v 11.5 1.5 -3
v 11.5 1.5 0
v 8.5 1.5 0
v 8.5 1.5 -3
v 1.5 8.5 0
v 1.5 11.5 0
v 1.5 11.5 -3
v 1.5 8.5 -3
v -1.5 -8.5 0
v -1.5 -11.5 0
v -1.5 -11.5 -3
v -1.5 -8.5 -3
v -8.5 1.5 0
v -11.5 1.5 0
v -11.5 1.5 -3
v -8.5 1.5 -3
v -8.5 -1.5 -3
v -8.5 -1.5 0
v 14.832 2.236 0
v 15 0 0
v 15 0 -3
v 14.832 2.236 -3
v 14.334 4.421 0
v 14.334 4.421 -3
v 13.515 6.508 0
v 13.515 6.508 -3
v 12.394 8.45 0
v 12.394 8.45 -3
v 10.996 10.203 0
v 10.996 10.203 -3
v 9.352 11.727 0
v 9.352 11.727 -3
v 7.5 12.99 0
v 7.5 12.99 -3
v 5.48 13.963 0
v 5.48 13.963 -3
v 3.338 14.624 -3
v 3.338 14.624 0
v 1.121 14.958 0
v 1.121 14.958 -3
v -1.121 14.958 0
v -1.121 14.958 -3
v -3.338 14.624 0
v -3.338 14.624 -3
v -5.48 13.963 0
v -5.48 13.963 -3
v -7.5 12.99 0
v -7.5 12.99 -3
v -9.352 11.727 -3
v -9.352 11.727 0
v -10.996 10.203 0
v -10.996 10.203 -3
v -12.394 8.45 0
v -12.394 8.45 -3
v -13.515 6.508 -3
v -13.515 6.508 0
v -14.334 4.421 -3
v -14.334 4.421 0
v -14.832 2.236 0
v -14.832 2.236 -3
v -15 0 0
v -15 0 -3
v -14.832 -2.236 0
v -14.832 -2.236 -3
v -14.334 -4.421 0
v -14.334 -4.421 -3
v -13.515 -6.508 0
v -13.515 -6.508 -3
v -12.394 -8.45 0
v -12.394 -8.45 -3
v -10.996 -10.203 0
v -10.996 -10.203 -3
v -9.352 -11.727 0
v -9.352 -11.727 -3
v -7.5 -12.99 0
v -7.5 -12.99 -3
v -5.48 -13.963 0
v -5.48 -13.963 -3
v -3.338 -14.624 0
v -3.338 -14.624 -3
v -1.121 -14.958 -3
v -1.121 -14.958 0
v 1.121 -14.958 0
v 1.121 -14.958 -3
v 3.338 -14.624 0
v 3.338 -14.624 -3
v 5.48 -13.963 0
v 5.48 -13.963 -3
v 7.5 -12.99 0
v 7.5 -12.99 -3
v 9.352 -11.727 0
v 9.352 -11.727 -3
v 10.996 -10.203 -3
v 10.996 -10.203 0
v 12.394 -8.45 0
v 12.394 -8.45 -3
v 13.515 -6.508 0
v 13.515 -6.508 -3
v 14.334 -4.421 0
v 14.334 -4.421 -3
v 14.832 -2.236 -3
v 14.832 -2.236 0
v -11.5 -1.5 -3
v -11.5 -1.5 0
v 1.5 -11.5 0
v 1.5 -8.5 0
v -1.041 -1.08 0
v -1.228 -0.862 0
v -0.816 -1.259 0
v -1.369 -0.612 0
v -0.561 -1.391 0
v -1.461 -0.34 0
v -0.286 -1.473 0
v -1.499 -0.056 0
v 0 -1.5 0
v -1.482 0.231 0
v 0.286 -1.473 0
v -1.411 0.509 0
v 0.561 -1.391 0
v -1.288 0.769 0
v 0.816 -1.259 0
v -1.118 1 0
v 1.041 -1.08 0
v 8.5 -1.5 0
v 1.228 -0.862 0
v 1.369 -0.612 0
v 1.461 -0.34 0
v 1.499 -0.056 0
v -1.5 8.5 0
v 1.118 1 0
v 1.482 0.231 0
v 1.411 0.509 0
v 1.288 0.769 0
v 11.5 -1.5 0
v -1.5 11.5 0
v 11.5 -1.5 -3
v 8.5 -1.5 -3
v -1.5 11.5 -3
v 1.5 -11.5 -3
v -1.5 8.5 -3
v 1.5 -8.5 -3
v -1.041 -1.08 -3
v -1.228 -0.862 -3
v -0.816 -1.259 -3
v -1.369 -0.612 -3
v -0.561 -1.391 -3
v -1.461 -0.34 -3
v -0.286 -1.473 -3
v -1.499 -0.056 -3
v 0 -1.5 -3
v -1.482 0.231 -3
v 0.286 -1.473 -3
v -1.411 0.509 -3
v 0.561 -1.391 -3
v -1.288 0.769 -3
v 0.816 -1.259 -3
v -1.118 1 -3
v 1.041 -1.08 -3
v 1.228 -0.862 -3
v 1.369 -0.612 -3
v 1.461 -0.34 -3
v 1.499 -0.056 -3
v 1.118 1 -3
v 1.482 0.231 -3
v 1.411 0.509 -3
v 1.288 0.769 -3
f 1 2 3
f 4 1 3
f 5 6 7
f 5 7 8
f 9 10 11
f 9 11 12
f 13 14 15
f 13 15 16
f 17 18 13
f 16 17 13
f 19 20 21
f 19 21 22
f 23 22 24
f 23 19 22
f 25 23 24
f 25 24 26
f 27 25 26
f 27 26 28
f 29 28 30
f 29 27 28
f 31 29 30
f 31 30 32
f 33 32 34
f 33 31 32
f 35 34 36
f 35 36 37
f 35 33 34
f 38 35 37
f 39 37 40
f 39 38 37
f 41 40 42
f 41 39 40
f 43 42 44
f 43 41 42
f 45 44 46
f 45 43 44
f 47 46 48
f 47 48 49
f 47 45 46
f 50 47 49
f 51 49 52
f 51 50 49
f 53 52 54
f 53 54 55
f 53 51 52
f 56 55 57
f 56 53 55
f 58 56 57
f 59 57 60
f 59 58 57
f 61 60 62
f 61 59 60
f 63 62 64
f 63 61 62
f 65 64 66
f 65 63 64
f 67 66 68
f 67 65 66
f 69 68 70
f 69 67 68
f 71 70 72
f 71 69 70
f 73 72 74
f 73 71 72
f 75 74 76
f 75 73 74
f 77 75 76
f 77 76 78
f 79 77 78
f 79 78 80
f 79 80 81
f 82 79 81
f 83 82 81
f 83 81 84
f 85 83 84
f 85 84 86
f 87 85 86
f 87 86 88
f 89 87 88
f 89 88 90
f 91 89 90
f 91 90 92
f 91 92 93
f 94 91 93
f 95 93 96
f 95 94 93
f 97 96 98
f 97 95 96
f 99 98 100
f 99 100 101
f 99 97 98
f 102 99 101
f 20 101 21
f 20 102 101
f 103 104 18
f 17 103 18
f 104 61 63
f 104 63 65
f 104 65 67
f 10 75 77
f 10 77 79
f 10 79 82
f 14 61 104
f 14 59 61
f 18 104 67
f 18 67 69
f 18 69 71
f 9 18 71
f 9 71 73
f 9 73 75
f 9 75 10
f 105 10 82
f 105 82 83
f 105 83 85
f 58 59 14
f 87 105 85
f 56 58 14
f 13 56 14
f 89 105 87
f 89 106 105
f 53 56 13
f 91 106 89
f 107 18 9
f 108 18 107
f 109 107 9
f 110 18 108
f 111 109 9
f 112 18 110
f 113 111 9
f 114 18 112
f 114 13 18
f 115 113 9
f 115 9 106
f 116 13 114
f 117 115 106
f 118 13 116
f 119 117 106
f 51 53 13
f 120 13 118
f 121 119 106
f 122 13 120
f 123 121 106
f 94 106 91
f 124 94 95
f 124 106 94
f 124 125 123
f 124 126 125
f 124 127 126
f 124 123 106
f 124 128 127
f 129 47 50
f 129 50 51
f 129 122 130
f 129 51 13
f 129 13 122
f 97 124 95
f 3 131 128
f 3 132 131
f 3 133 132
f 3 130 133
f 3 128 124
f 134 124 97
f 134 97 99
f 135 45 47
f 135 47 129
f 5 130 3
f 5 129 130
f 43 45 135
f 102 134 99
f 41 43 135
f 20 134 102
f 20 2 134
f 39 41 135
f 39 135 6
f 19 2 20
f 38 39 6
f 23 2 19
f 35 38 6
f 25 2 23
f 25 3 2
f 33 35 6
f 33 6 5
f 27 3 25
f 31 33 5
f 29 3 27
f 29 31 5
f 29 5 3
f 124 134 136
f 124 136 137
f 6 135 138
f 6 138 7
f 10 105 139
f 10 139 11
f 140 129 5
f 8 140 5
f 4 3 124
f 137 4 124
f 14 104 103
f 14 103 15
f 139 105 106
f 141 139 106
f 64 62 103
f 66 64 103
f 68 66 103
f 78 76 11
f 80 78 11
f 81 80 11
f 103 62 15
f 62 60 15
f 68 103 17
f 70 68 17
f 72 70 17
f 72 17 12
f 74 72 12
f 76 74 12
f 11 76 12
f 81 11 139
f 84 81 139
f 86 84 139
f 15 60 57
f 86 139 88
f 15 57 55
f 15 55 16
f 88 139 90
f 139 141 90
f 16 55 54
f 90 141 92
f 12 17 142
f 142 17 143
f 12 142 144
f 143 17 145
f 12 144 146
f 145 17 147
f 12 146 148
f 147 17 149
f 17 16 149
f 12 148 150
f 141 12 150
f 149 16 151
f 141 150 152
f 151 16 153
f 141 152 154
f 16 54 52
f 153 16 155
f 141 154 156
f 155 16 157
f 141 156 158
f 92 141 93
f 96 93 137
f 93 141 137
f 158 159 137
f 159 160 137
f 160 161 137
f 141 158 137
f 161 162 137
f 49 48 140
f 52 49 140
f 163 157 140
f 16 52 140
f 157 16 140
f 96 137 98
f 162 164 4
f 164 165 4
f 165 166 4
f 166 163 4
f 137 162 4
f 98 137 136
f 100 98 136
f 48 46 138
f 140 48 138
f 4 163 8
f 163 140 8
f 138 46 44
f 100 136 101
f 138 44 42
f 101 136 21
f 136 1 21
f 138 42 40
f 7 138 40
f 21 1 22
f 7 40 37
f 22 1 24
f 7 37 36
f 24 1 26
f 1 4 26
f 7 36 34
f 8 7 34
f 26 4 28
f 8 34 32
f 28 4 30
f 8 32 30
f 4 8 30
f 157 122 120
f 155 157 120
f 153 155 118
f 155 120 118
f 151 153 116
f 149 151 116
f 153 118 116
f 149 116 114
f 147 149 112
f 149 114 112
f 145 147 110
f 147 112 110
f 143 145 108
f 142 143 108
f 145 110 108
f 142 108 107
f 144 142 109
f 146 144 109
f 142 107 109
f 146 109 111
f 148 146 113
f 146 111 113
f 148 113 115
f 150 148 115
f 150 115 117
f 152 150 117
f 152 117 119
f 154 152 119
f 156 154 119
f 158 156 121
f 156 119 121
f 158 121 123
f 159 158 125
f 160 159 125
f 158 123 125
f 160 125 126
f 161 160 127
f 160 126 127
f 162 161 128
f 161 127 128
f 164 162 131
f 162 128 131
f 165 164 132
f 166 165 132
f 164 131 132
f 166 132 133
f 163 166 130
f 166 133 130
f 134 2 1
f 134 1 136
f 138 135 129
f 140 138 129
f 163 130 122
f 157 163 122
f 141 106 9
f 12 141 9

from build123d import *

# Parameters (mm, degrees)
F1_R            = 15
F2_DEPTH        = 3
F3_W            = 3
F3_H            = 3
F4_DEPTH        = 3
F4_COPIES_COUNT = 4
F6_DEPTH        = 3


# Not quite as in the source:
# - a pattern or mirror of a feature is missing from the dataset's text; its kind, count and spacing are read off the source's solid


with BuildPart() as f2:
    # F1 (on Top) → F2 (new body)
    with BuildSketch(Plane.XY):
        Circle(F1_R)
    extrude(amount=-F2_DEPTH)

    # F3 (on face) → F4 (cut, through all)
    with BuildSketch(Plane.XY):
        with Locations((-10, 0)):
            Rectangle(F3_W, F3_H)
    f4 = extrude(amount=-F4_DEPTH, mode=Mode.SUBTRACT)

    # F4_copies: F4 ×4 about axis
    f4_copies_axis = Axis((0, 0, 0), (0, 0, 1))
    for i in range(1, F4_COPIES_COUNT):
        add(f4.rotate(f4_copies_axis, i * 360 / F4_COPIES_COUNT), mode=Mode.SUBTRACT)

    # F5 (on face) → F6 (cut, through all)
    with BuildSketch(Plane.XY):
        with BuildLine():
            Line((1.1180339887, 1), (-1.1180339887, 1))
            ThreePointArc((-1.1180339887, 1), (0, -1.5), (1.1180339887, 1))
        make_face()
    extrude(amount=-F6_DEPTH, mode=Mode.SUBTRACT)


solid = f2.part
